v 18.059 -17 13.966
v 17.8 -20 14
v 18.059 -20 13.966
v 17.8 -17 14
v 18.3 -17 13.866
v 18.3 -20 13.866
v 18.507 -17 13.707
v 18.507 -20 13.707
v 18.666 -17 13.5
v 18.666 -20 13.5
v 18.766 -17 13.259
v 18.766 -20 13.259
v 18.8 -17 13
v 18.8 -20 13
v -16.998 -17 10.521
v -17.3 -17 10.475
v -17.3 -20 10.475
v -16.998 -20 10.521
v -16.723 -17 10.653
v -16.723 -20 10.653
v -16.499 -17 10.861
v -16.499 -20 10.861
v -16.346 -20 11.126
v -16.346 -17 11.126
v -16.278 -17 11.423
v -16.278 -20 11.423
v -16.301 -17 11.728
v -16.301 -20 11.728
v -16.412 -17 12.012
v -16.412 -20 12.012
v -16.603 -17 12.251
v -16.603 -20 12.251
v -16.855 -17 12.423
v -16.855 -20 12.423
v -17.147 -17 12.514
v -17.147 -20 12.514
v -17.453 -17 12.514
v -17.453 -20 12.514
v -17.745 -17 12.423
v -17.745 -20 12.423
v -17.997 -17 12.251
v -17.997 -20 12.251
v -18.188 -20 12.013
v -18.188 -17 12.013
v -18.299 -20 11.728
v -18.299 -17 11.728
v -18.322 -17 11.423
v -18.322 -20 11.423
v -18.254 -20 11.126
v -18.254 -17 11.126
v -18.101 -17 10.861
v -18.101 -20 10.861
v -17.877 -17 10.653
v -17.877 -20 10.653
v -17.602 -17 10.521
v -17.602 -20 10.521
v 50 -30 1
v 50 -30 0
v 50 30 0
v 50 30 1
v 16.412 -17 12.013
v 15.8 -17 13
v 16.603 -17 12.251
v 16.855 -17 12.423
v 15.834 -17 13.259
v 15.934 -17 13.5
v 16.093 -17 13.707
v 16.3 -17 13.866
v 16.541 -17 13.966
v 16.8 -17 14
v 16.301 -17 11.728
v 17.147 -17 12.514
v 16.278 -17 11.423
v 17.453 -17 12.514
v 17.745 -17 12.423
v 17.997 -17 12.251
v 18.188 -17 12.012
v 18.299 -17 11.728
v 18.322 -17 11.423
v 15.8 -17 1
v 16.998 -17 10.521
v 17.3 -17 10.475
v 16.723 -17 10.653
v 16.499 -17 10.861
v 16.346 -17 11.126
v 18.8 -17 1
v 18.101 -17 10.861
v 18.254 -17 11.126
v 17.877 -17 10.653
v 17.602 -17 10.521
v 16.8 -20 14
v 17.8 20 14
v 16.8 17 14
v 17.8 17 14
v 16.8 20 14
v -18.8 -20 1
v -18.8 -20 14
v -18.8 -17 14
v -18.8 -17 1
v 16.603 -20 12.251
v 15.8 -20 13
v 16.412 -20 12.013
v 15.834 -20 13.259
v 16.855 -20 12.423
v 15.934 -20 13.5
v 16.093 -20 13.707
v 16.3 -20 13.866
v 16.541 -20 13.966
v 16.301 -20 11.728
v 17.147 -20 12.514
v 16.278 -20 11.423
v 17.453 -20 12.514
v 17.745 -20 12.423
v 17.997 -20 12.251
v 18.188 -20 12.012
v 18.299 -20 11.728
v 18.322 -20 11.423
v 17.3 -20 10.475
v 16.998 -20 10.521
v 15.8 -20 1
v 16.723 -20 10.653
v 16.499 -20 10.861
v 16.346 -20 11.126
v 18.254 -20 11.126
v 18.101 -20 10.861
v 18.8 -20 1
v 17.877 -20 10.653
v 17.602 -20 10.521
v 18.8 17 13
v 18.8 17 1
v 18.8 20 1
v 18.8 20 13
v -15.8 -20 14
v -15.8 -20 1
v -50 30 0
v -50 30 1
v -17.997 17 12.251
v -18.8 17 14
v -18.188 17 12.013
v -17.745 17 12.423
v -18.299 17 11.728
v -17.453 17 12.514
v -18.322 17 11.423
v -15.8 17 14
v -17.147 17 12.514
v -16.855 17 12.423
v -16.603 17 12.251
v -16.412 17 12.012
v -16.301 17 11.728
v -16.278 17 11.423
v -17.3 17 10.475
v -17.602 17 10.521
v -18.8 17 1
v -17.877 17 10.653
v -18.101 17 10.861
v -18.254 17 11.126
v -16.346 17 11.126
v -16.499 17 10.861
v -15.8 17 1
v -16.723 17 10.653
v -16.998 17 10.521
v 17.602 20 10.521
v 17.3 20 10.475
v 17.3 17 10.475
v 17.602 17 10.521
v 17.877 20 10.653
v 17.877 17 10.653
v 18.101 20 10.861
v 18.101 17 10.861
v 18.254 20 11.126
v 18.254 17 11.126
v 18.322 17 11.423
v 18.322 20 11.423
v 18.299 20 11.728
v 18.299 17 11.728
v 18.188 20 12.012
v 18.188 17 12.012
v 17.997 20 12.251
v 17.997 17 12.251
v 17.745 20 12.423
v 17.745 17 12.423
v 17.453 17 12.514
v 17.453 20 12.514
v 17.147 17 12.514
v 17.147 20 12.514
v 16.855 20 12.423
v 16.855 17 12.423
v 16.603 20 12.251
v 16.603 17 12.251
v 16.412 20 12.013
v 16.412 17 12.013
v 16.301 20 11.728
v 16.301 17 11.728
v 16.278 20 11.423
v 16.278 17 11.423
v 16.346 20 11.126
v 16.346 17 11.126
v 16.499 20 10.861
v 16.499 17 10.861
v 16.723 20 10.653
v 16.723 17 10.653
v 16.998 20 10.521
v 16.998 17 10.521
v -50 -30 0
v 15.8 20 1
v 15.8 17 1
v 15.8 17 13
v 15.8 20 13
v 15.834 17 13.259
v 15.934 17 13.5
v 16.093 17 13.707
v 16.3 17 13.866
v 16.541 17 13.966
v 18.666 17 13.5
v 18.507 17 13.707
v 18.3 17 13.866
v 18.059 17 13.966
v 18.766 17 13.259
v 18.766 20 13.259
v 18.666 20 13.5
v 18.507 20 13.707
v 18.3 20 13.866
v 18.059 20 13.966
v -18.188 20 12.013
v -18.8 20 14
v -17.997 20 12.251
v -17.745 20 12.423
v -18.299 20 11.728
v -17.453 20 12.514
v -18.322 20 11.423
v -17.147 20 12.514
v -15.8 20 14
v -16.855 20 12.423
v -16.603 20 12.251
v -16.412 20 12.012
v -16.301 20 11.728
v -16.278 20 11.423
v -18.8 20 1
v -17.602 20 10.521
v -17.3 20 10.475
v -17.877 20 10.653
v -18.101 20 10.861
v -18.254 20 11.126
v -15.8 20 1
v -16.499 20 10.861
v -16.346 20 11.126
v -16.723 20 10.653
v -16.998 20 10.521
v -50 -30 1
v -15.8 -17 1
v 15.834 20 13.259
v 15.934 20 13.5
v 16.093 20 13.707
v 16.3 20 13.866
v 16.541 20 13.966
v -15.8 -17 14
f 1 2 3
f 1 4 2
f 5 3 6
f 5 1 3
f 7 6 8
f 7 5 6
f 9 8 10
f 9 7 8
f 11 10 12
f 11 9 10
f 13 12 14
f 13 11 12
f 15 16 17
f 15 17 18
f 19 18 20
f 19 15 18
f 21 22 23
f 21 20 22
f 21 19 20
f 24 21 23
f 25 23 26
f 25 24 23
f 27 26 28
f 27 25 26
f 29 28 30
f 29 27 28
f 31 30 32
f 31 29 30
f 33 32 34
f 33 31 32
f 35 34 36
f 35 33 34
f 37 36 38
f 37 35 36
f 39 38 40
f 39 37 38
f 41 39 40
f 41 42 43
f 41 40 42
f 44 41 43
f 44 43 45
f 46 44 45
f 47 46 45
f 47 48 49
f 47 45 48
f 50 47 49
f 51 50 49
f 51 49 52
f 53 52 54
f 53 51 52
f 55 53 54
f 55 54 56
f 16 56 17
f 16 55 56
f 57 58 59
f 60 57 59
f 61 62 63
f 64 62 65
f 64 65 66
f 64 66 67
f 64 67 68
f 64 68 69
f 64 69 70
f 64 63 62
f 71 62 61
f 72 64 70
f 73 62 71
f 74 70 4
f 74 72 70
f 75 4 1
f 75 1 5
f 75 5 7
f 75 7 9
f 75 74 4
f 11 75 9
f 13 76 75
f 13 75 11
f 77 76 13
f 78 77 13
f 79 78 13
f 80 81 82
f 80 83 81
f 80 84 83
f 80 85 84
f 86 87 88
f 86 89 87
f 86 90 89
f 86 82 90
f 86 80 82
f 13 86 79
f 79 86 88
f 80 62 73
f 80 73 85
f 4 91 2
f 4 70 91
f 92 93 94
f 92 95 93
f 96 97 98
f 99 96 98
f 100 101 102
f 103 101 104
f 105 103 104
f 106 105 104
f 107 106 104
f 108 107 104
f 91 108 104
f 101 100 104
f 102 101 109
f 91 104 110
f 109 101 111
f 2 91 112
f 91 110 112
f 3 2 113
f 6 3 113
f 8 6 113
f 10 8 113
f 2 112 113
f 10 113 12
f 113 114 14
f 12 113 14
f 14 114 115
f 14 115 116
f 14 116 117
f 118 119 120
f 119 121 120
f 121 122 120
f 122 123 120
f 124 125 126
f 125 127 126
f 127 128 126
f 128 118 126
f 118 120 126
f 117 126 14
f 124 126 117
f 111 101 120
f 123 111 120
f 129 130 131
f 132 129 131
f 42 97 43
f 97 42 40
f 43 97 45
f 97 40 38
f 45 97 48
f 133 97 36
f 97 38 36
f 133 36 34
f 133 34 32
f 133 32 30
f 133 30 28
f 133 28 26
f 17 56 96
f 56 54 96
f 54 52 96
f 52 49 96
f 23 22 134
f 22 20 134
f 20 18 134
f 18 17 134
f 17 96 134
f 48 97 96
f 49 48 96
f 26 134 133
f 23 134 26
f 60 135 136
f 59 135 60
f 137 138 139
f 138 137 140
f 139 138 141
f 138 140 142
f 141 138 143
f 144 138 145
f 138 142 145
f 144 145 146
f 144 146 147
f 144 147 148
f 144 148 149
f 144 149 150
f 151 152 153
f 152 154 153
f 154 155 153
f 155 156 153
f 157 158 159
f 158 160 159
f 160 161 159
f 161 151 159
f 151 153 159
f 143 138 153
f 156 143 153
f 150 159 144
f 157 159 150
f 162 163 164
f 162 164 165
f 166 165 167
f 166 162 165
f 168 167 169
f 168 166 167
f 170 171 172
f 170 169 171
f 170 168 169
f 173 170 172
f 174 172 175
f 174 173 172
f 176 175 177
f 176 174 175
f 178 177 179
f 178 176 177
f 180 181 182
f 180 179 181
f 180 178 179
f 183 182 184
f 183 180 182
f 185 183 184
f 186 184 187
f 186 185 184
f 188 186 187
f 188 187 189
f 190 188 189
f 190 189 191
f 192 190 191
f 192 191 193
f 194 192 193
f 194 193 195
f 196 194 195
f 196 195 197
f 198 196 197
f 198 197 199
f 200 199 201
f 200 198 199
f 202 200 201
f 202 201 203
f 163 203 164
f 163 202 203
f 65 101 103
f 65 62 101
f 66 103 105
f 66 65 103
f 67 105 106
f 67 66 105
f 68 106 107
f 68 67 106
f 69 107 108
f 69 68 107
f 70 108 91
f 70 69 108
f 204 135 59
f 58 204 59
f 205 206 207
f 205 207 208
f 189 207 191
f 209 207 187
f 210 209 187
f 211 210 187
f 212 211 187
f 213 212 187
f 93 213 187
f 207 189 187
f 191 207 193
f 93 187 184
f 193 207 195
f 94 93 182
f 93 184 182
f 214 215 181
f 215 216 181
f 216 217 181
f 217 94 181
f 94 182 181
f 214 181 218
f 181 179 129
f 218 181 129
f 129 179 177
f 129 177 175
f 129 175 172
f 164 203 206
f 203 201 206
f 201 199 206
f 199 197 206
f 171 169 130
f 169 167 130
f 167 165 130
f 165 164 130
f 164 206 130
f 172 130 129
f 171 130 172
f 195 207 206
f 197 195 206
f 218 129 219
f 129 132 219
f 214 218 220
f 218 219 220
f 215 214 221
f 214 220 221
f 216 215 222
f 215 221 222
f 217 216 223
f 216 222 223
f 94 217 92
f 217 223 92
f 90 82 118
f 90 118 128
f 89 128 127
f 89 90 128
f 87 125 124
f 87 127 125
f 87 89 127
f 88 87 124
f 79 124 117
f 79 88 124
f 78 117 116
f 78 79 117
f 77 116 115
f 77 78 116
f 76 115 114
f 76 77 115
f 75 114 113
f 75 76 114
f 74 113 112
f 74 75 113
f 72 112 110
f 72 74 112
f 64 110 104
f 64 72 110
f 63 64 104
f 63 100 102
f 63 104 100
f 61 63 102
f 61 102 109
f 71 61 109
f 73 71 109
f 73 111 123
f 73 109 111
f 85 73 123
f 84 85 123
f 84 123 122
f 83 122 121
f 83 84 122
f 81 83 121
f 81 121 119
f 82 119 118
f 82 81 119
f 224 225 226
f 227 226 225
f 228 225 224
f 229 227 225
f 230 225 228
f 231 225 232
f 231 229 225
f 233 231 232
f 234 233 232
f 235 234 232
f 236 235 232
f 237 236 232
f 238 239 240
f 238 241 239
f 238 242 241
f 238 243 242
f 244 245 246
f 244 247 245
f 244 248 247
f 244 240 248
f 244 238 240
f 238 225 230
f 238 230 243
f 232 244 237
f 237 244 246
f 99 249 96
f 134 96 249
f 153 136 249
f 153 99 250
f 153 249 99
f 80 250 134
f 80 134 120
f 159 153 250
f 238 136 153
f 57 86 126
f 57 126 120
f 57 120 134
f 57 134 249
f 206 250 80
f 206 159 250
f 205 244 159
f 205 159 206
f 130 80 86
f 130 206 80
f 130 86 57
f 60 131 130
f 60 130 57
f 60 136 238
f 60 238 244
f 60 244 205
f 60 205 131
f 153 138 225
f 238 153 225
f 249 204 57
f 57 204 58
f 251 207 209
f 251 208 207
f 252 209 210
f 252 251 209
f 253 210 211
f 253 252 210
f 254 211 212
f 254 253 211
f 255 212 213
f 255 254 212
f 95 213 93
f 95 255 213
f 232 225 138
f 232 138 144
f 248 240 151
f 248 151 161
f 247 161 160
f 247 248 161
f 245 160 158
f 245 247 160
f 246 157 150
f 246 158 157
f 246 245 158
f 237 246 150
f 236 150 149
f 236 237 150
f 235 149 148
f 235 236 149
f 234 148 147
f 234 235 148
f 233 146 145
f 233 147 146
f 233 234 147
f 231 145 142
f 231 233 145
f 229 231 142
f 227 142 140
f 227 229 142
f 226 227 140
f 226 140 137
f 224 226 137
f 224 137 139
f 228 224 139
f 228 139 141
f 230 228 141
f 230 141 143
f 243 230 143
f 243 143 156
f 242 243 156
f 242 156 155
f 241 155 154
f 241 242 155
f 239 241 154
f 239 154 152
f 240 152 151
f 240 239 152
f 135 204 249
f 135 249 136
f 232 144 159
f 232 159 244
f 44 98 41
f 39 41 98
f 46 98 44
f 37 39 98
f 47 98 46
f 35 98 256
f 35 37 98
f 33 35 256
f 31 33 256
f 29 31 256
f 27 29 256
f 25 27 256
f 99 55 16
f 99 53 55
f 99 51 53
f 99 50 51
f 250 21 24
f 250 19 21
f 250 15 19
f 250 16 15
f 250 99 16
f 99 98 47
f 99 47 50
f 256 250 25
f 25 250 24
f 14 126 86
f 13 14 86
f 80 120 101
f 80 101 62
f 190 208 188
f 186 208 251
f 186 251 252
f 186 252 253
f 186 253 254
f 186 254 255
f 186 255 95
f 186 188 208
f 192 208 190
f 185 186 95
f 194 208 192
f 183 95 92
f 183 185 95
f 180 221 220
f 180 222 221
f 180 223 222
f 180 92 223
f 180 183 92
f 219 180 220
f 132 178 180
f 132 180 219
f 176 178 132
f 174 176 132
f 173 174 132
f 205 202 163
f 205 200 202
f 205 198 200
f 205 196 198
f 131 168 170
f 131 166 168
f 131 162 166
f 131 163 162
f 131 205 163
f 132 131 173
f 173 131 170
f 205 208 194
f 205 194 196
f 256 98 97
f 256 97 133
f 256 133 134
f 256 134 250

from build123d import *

# Parameters (mm, degrees)
ESBO_O1_W                  = 100
ESBO_O1_H                  = 60
RESSALTO_EXTRUS_O1_DEPTH   = 1
ESBO_O2_W                  = 3
ESBO_O2_H                  = 3
RESSALTO_EXTRUS_O2_DEPTH   = 14
CORTE_EXTRUS_O1_DEPTH      = 73.083285164
CORTE_EXTRUS_O1_DEPTH_BACK = 73.083285164
ESBO_O3_R                  = 1.025
FILETE1_R                  = 1
FILETE2_R                  = 1


with BuildPart() as part:
    # Esboço1 → Ressalto-extrusão1 (new body)
    with BuildSketch(Plane.XY):
        Rectangle(ESBO_O1_W, ESBO_O1_H)
    extrude(amount=RESSALTO_EXTRUS_O1_DEPTH)

    # Esboço2 → Ressalto-extrusão2 (add)
    with BuildSketch(Plane.XY):
        with Locations((17.3, 18.5)):
            Rectangle(ESBO_O2_W, ESBO_O2_H)
        with Locations((17.3, -18.5)):
            Rectangle(ESBO_O2_W, ESBO_O2_H)
        with Locations((-17.3, -18.5)):
            Rectangle(ESBO_O2_W, ESBO_O2_H)
        with Locations((-17.3, 18.5)):
            Rectangle(ESBO_O2_W, ESBO_O2_H)
    extrude(amount=RESSALTO_EXTRUS_O2_DEPTH)

    # Esboço3 → Corte-extrusão1 (cut, two sides: drawn at the far end of the back side and taken through both)
    with BuildSketch(Plane(origin=(0, -20, 0), x_dir=(-1, 0, 0), z_dir=(0, -1, 0)).offset(-CORTE_EXTRUS_O1_DEPTH_BACK)):
        with Locations(Location((-17.3, -11.5, 0), (0, 0, 90))):
            Circle(ESBO_O3_R)
        with Locations(Location((17.3, -11.5, 0), (0, 0, 90))):
            Circle(ESBO_O3_R)
    extrude(amount=CORTE_EXTRUS_O1_DEPTH + CORTE_EXTRUS_O1_DEPTH_BACK, mode=Mode.SUBTRACT)

    # Filete1
    filete1_edges = [part.edges().sort_by_distance(p)[0] for p in [
        (15.8, -18.5, 14),
    ]]
    fillet(filete1_edges, radius=FILETE1_R)

    # Filete2
    filete2_edges = [part.edges().sort_by_distance(p)[0] for p in [
        (18.8, 18.5, 14),
        (15.8, 18.5, 14),
        (18.8, -18.5, 14),
    ]]
    fillet(filete2_edges, radius=FILETE2_R)


solid = part.part
